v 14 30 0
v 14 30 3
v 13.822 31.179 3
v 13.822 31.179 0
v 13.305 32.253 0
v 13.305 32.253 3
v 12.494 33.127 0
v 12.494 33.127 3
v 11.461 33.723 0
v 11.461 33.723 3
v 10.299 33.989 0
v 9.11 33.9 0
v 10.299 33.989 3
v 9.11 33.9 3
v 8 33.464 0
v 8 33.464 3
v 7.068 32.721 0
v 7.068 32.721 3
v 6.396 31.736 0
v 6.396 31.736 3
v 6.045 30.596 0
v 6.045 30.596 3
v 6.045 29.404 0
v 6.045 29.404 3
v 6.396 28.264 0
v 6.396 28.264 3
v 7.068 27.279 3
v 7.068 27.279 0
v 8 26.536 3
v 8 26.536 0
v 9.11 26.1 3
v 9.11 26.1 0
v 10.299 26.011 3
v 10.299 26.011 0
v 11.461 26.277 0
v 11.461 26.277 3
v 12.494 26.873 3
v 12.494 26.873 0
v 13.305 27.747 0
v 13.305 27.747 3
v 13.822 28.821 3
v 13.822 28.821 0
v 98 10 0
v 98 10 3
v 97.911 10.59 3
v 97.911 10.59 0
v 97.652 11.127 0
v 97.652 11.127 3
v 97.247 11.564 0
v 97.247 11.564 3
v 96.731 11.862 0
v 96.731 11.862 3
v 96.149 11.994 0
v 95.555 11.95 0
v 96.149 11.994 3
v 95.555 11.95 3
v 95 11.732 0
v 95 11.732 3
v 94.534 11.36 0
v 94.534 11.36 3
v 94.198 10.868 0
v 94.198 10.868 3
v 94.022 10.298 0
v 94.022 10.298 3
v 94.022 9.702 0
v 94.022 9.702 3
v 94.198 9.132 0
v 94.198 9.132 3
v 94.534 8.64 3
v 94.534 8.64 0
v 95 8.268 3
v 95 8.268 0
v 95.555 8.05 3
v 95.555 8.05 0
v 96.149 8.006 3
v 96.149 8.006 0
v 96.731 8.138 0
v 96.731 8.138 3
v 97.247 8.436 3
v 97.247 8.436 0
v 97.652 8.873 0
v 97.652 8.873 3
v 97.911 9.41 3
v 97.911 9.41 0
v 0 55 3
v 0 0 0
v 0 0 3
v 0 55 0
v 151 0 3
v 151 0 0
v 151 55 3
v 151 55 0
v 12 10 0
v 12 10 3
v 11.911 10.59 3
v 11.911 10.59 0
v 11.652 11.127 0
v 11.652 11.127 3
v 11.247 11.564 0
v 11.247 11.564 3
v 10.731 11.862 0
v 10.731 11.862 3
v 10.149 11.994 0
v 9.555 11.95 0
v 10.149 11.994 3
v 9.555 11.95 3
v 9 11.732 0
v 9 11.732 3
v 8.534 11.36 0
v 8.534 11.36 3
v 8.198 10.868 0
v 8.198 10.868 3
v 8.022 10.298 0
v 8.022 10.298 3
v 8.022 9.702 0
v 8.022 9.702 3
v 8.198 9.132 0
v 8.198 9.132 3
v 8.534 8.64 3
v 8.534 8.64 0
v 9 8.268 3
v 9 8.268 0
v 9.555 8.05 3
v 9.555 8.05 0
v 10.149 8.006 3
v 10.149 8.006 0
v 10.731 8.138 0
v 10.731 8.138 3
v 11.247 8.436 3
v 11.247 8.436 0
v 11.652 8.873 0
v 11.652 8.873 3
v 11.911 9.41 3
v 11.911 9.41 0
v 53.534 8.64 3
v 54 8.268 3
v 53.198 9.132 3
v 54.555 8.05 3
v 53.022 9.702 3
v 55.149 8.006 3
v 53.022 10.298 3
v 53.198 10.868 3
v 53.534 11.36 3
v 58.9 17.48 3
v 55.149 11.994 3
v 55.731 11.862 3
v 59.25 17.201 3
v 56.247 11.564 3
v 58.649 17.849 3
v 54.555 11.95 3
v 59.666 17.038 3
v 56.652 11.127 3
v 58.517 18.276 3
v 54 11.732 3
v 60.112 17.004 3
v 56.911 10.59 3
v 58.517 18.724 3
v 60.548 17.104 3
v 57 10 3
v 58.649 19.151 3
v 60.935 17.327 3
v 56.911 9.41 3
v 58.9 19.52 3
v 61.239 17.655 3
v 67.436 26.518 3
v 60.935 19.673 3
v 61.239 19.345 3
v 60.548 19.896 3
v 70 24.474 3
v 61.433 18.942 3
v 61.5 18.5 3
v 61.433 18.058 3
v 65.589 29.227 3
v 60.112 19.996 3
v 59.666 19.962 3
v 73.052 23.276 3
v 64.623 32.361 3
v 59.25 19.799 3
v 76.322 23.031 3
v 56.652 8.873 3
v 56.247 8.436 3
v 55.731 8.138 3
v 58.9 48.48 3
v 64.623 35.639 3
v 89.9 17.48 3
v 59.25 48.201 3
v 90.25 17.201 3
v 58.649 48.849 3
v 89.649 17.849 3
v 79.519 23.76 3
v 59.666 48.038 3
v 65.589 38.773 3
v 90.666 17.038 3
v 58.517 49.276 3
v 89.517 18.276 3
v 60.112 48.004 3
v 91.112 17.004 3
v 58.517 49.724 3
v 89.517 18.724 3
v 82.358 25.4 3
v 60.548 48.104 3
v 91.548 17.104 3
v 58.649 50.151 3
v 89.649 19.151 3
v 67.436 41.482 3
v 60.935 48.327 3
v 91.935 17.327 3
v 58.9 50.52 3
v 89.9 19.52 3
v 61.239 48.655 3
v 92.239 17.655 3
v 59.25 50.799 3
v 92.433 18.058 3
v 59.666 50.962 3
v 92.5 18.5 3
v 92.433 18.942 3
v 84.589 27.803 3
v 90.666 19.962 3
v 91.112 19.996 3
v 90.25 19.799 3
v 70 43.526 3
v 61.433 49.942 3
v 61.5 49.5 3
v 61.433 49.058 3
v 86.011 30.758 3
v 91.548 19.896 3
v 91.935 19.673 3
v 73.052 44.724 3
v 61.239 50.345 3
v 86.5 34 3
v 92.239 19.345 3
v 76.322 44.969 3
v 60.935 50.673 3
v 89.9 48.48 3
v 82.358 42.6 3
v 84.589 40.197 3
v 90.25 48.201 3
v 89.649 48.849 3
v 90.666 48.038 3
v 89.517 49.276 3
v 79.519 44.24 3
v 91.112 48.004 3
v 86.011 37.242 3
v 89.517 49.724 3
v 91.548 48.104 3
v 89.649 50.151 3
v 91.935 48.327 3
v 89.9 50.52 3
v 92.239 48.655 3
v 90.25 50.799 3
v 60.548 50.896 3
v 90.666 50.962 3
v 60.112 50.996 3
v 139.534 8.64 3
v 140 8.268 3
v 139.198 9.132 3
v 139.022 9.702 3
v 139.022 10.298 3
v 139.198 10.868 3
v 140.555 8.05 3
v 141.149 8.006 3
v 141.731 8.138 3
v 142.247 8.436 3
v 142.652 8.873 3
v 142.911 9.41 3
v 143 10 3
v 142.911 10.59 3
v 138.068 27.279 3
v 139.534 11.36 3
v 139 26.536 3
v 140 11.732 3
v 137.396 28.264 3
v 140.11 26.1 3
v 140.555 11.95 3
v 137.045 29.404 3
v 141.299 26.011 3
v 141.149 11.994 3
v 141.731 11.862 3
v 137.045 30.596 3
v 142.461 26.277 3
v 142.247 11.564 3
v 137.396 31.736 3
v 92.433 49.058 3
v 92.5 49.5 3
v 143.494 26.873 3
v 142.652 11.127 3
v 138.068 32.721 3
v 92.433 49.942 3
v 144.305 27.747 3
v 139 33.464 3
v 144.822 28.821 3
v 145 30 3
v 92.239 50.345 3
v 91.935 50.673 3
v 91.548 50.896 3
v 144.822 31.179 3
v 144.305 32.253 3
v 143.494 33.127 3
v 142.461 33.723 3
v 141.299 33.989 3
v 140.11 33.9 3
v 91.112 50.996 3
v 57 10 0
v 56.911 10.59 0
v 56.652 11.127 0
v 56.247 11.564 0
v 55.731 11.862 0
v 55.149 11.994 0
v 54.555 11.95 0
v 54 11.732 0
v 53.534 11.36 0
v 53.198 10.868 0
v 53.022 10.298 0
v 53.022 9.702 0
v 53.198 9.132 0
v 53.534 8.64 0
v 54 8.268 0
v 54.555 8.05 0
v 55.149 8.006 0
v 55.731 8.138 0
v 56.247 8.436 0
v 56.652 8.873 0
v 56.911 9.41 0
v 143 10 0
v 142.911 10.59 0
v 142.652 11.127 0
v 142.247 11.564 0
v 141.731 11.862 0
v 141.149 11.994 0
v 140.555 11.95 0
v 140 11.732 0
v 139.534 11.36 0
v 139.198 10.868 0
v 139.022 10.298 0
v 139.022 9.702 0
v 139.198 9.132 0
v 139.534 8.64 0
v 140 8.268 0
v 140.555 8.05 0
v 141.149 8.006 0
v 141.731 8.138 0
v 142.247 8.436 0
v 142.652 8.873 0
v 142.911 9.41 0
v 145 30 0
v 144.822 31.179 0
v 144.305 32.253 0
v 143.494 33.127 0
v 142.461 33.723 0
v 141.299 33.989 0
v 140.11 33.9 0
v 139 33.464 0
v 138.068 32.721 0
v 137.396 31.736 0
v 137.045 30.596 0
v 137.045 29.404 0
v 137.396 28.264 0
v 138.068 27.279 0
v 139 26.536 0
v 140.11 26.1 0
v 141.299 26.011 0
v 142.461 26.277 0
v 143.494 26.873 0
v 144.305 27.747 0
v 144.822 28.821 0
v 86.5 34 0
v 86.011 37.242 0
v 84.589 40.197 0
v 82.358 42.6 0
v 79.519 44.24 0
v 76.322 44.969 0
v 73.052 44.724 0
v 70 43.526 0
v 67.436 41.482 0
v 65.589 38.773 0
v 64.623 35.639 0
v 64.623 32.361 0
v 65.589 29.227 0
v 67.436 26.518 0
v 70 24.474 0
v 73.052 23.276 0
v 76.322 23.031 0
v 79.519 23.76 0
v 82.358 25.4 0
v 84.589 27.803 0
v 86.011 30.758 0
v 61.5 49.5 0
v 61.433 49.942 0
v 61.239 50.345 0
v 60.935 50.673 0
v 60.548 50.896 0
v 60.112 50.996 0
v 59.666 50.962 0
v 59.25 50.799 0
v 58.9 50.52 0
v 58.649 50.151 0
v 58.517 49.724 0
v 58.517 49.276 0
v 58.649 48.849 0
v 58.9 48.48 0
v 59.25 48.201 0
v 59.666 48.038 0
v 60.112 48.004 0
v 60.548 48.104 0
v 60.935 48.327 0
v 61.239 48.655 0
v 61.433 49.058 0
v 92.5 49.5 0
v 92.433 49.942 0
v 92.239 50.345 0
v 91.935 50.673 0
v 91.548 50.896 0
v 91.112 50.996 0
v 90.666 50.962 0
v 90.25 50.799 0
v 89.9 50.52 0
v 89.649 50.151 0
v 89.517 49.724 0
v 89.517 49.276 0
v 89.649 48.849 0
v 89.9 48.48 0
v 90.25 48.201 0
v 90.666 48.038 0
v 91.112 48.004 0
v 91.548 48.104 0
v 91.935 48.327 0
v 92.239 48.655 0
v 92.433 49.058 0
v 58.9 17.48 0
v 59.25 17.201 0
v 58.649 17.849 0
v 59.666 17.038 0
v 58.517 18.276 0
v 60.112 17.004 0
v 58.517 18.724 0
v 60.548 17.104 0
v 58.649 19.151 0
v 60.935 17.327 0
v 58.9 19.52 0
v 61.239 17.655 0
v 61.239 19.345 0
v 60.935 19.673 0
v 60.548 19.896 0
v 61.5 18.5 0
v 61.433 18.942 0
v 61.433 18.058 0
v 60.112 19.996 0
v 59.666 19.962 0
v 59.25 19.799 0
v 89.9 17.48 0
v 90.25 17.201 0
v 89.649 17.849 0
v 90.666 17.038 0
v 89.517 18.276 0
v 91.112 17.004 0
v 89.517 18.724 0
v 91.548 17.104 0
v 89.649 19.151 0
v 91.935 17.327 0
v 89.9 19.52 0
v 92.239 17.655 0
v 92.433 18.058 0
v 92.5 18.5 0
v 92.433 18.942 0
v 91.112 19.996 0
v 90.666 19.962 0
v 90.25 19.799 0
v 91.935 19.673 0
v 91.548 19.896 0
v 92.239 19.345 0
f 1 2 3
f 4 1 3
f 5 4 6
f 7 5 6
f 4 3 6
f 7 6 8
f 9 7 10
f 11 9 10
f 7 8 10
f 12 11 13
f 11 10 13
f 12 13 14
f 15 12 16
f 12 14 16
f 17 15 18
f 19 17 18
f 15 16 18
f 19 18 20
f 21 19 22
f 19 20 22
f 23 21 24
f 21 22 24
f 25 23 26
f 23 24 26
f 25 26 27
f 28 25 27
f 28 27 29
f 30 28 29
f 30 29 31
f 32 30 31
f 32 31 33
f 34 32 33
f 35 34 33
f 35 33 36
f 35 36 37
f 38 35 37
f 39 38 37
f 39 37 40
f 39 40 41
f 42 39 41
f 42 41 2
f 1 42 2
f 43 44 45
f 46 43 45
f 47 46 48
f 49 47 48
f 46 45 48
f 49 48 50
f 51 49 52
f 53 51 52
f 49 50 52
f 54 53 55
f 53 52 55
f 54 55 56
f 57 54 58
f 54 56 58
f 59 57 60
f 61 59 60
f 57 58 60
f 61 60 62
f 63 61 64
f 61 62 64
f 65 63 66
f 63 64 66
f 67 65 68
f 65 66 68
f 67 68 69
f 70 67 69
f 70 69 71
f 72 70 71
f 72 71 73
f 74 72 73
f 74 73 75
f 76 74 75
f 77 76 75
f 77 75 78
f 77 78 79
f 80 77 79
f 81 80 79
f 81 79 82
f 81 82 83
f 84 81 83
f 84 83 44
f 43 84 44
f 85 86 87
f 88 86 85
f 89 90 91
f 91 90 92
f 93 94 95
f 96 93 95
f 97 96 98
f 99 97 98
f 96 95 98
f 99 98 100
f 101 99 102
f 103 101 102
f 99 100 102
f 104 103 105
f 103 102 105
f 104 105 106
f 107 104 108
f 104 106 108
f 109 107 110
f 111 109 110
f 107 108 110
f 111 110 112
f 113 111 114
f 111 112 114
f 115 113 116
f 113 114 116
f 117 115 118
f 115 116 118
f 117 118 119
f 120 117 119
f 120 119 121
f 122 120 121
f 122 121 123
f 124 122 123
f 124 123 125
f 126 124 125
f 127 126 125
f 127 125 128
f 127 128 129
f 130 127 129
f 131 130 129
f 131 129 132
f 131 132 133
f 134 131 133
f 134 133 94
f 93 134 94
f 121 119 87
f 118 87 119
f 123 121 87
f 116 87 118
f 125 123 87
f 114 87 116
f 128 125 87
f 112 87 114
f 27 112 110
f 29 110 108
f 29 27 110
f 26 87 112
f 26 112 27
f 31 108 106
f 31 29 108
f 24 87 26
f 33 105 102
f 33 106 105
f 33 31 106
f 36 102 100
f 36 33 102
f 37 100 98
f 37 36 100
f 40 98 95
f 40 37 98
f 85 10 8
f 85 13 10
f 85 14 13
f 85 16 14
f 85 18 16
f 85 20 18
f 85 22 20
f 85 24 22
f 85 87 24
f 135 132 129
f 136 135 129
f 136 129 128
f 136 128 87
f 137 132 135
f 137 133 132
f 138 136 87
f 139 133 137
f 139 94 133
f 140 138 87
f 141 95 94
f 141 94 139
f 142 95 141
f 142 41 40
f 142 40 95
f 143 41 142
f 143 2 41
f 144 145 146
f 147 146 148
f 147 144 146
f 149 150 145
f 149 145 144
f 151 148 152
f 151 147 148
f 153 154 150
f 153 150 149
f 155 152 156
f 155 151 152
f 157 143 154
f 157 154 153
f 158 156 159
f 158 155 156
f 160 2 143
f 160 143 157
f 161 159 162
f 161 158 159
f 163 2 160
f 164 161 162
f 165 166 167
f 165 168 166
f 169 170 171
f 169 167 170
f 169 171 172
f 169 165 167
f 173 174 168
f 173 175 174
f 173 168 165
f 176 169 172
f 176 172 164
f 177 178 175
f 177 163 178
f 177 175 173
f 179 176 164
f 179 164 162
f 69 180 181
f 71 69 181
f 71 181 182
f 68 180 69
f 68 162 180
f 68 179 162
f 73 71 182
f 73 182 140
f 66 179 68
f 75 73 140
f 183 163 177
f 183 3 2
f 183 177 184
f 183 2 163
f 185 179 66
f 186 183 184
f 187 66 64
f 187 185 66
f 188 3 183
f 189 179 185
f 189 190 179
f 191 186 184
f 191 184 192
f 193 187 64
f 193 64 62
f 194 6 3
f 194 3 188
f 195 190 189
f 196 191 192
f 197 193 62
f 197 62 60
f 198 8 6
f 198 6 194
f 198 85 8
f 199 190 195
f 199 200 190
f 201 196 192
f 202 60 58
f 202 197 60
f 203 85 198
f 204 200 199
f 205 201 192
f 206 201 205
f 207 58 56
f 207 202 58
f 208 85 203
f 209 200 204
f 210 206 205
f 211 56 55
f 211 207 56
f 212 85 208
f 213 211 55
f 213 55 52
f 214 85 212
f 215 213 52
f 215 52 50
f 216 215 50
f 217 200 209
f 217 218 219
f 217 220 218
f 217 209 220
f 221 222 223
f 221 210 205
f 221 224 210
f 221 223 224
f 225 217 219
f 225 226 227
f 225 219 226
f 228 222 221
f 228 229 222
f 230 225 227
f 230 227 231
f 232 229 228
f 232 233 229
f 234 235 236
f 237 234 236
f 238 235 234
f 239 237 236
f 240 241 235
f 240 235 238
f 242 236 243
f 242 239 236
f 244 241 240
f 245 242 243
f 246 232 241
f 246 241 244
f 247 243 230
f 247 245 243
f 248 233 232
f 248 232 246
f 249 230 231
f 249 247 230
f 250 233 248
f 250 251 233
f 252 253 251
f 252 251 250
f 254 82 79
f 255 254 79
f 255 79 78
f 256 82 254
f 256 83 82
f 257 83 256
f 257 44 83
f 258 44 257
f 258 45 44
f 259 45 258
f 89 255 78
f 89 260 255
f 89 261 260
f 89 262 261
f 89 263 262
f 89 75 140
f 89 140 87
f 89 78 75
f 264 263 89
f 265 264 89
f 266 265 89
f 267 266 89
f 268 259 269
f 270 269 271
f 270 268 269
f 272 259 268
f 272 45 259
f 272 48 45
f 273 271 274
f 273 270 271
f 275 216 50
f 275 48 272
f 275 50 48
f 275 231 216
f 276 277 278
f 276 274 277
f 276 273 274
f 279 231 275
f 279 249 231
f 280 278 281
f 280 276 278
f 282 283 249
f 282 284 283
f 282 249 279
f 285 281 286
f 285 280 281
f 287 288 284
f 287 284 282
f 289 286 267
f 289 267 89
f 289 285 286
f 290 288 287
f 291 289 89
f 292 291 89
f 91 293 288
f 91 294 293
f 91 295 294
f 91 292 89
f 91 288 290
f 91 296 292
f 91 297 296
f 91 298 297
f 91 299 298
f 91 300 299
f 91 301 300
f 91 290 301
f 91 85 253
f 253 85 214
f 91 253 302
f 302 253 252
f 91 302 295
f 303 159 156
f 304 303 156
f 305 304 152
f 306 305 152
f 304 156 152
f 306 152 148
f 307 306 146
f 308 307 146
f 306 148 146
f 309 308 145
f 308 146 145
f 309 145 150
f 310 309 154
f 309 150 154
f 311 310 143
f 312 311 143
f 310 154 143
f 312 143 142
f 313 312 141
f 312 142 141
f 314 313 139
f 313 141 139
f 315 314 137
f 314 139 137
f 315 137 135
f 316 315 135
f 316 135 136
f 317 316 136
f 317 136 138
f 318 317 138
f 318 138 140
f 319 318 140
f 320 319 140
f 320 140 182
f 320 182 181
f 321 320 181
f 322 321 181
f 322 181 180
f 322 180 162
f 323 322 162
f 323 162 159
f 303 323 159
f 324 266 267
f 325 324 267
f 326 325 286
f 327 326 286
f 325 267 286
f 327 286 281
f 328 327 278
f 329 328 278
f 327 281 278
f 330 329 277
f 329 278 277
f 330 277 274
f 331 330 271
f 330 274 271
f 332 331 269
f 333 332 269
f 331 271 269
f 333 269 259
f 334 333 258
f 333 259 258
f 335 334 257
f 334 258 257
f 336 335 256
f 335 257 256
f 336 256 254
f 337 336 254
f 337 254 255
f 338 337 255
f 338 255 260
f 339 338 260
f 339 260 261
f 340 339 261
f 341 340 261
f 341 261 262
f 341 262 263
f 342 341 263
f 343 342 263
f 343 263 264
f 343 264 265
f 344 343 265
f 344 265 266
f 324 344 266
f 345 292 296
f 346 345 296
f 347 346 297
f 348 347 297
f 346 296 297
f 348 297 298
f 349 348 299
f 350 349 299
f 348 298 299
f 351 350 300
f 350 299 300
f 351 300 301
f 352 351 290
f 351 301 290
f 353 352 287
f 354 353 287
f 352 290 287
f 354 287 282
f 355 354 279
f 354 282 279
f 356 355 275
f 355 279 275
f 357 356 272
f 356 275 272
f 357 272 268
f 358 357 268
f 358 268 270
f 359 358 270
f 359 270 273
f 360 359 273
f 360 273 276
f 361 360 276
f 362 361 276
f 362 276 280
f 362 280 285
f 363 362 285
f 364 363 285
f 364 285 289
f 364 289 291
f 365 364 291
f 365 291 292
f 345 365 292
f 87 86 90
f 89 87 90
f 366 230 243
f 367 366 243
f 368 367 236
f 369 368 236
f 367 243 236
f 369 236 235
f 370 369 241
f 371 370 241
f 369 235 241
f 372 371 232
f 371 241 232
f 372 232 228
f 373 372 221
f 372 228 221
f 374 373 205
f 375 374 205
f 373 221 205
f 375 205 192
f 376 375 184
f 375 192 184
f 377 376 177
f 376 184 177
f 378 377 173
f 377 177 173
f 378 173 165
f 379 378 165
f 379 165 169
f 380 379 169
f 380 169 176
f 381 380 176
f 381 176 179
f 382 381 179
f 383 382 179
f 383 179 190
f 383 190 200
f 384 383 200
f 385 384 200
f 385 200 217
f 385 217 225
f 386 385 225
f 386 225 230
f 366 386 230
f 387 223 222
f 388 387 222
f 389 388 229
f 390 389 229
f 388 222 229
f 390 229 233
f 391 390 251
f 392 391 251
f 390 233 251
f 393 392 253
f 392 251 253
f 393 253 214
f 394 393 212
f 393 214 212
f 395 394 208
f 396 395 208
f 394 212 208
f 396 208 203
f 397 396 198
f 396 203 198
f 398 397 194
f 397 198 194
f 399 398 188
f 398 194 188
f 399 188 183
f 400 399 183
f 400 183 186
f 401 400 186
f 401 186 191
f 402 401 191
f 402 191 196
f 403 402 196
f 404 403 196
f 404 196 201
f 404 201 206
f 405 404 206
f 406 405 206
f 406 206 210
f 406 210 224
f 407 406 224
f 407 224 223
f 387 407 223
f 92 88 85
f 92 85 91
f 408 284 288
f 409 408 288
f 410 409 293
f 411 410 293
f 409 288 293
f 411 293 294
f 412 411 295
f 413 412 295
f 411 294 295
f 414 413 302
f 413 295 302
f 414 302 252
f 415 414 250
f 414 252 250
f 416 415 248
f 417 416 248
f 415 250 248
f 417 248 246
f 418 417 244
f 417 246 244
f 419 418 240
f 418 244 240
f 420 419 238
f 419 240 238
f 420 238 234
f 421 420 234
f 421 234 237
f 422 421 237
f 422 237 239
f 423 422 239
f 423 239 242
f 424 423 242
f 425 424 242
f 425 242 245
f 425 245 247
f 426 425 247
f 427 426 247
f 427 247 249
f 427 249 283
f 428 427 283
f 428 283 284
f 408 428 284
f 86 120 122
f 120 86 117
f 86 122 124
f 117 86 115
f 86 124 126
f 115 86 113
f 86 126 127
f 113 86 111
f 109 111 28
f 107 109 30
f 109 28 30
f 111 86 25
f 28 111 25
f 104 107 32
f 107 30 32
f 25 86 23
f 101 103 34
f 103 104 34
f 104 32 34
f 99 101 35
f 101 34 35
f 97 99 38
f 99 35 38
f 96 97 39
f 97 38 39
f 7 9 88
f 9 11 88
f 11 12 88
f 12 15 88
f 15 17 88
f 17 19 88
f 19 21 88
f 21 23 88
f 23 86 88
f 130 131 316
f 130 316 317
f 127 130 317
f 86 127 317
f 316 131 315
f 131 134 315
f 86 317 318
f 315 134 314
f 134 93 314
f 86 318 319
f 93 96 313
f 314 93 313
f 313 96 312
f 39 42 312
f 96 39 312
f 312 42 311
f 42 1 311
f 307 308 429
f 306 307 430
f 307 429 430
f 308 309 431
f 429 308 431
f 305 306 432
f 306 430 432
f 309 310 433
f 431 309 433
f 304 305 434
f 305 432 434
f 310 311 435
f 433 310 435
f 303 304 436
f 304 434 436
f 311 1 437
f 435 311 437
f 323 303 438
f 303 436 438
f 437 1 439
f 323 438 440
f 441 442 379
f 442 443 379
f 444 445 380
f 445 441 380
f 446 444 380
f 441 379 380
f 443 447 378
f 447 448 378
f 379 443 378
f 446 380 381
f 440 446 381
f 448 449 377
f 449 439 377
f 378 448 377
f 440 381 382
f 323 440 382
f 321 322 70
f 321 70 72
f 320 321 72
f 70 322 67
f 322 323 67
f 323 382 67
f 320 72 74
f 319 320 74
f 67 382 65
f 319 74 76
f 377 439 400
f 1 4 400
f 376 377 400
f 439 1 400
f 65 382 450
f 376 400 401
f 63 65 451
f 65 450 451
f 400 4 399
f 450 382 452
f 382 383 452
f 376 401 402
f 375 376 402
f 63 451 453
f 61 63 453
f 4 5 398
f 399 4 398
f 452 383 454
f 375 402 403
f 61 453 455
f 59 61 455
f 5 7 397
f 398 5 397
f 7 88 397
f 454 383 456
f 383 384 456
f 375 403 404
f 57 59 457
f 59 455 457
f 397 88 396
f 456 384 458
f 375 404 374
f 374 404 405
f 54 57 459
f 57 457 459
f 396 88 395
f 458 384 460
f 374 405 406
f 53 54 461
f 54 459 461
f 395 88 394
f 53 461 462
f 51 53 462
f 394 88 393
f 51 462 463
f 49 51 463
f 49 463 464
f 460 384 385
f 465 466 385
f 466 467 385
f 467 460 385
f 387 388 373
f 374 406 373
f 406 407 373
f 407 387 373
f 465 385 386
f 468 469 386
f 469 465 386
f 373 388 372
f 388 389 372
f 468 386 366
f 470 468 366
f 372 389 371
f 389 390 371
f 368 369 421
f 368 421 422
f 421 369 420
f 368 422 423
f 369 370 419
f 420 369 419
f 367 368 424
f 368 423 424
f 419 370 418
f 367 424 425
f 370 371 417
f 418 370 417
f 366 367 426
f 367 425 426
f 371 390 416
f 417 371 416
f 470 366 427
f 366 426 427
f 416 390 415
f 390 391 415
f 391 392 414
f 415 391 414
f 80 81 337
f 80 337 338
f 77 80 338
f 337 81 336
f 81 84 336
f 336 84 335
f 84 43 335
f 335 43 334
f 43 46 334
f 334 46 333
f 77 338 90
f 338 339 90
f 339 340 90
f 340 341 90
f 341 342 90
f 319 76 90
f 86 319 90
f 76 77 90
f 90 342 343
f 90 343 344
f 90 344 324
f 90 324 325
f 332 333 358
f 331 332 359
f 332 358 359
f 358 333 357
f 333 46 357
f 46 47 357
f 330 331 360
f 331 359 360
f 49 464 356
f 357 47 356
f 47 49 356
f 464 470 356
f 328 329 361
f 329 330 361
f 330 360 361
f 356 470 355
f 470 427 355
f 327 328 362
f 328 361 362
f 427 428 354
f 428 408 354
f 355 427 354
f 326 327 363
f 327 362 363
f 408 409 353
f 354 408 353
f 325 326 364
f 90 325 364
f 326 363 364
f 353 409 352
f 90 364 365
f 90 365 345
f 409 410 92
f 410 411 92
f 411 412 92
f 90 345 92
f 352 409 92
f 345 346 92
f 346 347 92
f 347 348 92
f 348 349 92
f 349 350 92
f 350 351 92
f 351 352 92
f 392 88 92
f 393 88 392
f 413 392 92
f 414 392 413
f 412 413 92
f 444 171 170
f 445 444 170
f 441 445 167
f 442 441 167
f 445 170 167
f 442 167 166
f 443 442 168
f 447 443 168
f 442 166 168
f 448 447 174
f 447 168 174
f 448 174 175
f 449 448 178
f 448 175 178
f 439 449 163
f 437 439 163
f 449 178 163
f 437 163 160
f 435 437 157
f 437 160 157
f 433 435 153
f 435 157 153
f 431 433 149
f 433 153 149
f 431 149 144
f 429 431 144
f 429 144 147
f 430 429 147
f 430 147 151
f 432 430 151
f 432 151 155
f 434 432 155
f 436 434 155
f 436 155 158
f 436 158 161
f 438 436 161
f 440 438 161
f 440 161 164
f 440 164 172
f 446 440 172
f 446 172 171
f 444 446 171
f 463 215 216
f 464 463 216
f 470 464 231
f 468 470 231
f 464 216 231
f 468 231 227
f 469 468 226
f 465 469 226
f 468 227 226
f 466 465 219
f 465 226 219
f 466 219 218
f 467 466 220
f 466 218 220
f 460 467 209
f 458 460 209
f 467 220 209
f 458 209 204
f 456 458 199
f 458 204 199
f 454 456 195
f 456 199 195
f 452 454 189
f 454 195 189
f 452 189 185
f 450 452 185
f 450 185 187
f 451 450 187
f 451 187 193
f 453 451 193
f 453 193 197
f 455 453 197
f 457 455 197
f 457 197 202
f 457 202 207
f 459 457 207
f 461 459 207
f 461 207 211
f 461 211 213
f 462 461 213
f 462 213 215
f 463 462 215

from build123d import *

# Parameters (mm, degrees)
SKIZZE1_W                       = 151
SKIZZE1_H                       = 55
AUFSATZ_LINEAR_AUSTRAGEN1_DEPTH = 3
SKIZZE2_R                       = 11
SCHNITT_LINEAR_AUSTRAGEN1_DEPTH = 17
SKIZZE3_R                       = 1.5
SCHNITT_LINEAR_AUSTRAGEN2_DEPTH = 10
SKIZZE4_R                       = 4
SCHNITT_LINEAR_AUSTRAGEN3_DEPTH = 10
SKIZZE5_R                       = 2
SCHNITT_LINEAR_AUSTRAGEN4_DEPTH = 10


with BuildPart() as part:
    # Skizze1 → Aufsatz-Linear austragen1 (new body)
    with BuildSketch(Plane.XY):
        with Locations((75.5, 27.5)):
            Rectangle(SKIZZE1_W, SKIZZE1_H)
    extrude(amount=AUFSATZ_LINEAR_AUSTRAGEN1_DEPTH)

    # Skizze2 → Schnitt-Linear austragen1 (cut)
    with BuildSketch(Plane.XY.offset(3)):
        with Locations((75.5, 34)):
            Circle(SKIZZE2_R)
    extrude(amount=-SCHNITT_LINEAR_AUSTRAGEN1_DEPTH, mode=Mode.SUBTRACT)

    # Skizze3 → Schnitt-Linear austragen2 (cut)
    with BuildSketch(Plane.XY.offset(3)):
        with Locations((91, 49.5)):
            Circle(SKIZZE3_R)
        with Locations((91, 18.5)):
            Circle(SKIZZE3_R)
        with Locations((60, 18.5)):
            Circle(SKIZZE3_R)
        with Locations((60, 49.5)):
            Circle(SKIZZE3_R)
    extrude(amount=-SCHNITT_LINEAR_AUSTRAGEN2_DEPTH, mode=Mode.SUBTRACT)

    # Skizze4 → Schnitt-Linear austragen3 (cut)
    with BuildSketch(Plane.XY.offset(3)):
        with Locations((141, 30)):
            Circle(SKIZZE4_R)
        with Locations((10, 30)):
            Circle(SKIZZE4_R)
    extrude(amount=-SCHNITT_LINEAR_AUSTRAGEN3_DEPTH, mode=Mode.SUBTRACT)

    # Skizze5 → Schnitt-Linear austragen4 (cut)
    with BuildSketch(Plane.XY.offset(3)):
        with Locations((10, 10)):
            Circle(SKIZZE5_R)
        with Locations((55, 10)):
            Circle(SKIZZE5_R)
        with Locations((96, 10)):
            Circle(SKIZZE5_R)
        with Locations((141, 10)):
            Circle(SKIZZE5_R)
    extrude(amount=-SCHNITT_LINEAR_AUSTRAGEN4_DEPTH, mode=Mode.SUBTRACT)


solid = part.part
